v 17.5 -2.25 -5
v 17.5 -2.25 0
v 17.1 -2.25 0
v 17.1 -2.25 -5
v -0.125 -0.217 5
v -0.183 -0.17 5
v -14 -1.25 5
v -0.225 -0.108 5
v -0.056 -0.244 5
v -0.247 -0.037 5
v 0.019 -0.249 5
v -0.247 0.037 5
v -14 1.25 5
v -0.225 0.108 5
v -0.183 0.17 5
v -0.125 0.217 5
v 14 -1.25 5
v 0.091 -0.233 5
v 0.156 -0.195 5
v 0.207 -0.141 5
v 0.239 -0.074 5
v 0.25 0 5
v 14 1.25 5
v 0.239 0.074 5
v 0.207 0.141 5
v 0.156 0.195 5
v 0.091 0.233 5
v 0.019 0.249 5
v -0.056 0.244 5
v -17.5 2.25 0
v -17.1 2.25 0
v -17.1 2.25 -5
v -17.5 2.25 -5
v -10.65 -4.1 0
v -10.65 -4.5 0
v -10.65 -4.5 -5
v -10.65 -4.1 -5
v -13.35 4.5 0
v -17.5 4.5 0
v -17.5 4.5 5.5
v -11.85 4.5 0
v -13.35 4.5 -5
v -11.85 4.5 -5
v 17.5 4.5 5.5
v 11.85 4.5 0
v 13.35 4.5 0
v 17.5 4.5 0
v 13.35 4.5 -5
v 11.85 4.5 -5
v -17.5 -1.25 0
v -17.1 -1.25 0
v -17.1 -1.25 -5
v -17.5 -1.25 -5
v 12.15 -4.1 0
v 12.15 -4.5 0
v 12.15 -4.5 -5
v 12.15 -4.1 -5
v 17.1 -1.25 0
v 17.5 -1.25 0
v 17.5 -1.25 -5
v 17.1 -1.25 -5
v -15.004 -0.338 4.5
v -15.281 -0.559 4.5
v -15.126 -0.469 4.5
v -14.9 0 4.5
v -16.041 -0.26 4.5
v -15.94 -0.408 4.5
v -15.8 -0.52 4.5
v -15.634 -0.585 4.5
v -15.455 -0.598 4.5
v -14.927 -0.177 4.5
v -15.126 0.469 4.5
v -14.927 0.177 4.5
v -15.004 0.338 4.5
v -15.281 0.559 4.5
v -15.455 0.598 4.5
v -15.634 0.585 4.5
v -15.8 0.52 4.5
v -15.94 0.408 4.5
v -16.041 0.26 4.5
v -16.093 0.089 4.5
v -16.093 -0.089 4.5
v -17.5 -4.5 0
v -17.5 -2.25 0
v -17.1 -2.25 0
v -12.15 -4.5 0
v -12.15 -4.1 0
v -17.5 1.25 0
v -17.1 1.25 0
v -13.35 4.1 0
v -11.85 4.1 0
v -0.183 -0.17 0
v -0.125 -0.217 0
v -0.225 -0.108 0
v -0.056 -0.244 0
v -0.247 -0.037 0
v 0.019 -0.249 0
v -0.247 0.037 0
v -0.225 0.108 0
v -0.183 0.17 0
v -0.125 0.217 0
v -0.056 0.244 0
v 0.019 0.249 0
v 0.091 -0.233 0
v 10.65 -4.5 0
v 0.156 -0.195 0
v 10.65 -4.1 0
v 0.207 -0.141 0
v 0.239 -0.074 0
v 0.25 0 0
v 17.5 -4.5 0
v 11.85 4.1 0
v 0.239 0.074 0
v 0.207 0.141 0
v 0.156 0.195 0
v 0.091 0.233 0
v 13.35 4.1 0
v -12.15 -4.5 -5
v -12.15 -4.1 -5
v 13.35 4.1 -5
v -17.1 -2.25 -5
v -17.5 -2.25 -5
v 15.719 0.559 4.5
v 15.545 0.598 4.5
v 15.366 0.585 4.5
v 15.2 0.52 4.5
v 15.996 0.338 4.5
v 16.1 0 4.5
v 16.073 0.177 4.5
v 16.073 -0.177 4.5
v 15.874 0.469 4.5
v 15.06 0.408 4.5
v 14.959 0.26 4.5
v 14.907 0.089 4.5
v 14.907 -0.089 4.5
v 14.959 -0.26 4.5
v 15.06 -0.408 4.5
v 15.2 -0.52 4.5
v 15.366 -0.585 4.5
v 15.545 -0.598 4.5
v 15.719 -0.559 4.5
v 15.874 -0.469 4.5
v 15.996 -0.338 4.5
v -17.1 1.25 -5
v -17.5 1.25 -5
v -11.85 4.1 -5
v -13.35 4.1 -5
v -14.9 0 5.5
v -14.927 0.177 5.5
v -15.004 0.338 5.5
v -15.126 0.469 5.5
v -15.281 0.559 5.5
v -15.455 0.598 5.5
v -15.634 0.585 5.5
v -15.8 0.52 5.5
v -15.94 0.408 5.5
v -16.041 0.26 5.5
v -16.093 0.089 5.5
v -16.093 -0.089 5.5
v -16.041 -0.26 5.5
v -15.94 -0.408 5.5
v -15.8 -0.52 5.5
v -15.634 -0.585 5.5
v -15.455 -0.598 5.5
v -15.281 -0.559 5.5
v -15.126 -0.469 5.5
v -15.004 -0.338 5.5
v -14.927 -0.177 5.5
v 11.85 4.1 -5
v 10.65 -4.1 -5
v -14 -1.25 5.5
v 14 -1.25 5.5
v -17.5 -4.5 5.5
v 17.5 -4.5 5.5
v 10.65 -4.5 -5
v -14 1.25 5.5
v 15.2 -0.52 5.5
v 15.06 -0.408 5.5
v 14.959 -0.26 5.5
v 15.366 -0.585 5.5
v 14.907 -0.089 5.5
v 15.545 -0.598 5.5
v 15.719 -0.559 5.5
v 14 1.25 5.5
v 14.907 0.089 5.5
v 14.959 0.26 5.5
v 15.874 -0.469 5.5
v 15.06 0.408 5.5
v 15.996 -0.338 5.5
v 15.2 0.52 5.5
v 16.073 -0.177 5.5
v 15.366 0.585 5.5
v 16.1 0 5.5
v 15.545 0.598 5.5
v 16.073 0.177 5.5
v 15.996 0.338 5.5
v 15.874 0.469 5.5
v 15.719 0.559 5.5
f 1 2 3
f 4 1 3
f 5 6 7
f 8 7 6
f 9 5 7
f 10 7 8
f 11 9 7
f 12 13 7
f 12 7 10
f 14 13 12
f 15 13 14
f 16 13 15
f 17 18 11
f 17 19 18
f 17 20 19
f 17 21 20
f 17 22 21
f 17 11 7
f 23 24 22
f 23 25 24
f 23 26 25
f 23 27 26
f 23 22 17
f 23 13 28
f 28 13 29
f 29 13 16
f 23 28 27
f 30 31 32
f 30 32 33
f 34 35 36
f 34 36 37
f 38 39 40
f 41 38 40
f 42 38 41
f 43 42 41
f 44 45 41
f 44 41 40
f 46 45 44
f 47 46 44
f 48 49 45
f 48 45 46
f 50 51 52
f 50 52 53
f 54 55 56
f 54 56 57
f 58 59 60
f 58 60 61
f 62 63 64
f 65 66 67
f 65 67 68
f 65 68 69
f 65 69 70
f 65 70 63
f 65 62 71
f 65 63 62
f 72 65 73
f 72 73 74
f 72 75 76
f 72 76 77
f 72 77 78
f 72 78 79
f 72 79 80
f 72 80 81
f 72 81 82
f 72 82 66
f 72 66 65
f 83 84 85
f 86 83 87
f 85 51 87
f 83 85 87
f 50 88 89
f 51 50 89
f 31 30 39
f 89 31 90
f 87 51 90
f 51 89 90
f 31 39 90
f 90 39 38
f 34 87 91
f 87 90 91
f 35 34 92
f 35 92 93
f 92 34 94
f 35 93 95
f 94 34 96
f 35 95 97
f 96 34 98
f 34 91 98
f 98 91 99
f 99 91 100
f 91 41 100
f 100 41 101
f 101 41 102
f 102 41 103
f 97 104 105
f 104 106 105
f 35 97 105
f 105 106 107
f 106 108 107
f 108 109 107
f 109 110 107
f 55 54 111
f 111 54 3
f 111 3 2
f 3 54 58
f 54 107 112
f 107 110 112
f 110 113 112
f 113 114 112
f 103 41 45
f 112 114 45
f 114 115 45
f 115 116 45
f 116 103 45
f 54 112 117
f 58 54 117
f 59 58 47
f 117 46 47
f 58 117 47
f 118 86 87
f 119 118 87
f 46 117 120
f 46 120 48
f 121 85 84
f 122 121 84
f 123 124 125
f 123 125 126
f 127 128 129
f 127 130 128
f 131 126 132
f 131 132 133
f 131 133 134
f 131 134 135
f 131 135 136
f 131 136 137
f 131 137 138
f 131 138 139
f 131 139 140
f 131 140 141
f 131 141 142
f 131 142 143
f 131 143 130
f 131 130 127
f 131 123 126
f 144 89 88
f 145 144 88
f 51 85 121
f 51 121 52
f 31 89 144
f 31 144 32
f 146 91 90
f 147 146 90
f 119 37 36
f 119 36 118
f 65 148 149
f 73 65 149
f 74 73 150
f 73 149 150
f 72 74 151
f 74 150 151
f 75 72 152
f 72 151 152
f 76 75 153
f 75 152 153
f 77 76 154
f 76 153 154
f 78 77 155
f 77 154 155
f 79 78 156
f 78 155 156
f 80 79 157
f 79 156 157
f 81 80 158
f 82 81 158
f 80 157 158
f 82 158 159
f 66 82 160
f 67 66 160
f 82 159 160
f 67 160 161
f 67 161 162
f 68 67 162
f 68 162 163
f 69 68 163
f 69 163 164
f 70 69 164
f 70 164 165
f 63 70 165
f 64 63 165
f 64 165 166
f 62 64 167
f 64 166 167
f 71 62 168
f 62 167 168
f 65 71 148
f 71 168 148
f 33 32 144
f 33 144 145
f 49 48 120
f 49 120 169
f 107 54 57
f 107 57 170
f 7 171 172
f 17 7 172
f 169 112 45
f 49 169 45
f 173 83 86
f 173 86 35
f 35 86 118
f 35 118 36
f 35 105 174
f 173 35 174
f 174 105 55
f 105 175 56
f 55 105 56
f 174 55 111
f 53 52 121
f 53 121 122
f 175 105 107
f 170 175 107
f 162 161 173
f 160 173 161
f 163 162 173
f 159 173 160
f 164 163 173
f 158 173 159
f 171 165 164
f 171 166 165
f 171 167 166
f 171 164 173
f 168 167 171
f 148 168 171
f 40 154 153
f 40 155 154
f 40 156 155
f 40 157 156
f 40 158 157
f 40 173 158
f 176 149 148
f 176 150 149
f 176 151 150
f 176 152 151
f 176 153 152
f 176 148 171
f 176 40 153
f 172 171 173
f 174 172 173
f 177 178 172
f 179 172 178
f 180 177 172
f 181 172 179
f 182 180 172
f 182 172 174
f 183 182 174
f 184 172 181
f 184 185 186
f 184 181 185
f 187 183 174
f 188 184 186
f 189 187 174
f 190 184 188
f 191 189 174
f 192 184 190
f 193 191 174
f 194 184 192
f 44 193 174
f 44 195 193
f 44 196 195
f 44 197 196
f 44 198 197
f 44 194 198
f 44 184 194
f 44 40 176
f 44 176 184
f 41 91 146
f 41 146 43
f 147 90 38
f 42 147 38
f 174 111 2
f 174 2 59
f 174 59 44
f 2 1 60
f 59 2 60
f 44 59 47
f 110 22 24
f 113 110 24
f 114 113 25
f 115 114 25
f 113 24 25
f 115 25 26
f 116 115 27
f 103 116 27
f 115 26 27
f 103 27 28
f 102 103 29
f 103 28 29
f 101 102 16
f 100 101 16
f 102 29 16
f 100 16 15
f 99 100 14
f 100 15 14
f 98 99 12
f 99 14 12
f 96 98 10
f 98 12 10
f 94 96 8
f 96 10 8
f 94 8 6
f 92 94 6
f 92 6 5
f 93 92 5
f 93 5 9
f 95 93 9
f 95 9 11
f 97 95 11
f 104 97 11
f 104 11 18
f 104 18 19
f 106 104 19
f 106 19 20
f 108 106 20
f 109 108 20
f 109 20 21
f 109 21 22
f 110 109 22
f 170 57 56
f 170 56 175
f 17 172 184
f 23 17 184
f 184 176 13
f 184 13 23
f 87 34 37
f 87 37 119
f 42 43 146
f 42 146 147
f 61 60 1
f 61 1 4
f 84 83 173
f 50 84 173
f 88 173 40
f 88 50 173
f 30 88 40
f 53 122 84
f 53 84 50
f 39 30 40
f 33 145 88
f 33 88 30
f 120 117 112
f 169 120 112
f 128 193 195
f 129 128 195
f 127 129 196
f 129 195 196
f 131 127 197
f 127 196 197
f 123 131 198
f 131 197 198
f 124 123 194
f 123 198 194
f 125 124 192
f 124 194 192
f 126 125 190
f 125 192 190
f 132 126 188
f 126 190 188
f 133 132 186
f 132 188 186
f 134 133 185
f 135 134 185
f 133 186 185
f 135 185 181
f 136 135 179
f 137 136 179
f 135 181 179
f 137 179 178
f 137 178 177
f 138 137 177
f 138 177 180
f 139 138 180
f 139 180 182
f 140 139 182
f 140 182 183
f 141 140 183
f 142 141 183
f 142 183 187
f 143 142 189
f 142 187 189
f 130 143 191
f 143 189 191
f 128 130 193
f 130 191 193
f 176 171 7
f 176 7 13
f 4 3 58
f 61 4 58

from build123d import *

# Parameters (mm, degrees)
BODY_2_W                        = 35
BODY_2_H                        = 9
BODY_DEPTH                      = 5.5
HOLES_2_R                       = 0.6
HOLES_DEPTH                     = 1
CHANNEL_2_W                     = 28
CHANNEL_2_H                     = 2.5
CHANNEL_DEPTH                   = 0.5
CONNECTION_PINS_2_W             = 1.5
CONNECTION_PINS_2_H             = 0.4
CONNECTION_PINS_2_W_2           = 0.4
CONNECTION_PINS_2_H_2           = 1
CONNECTION_PINS_DEPTH           = 5
SKIZZE1_R                       = 0.25
SCHNITT_LINEAR_AUSTRAGEN1_DEPTH = 11


with BuildPart() as part:
    # body 2 → body (new body)
    with BuildSketch(Plane.XY):
        Rectangle(BODY_2_W, BODY_2_H)
    extrude(amount=BODY_DEPTH)

    # holes 2 → holes (cut)
    with BuildSketch(Plane.XY.offset(5.5)):
        with Locations((-15.5, 0)):
            Circle(HOLES_2_R)
        with Locations((15.5, 0)):
            Circle(HOLES_2_R)
    extrude(amount=-HOLES_DEPTH, mode=Mode.SUBTRACT)

    # channel 2 → channel (cut)
    with BuildSketch(Plane.XY.offset(5.5)):
        Rectangle(CHANNEL_2_W, CHANNEL_2_H)
    extrude(amount=-CHANNEL_DEPTH, mode=Mode.SUBTRACT)

    # connection pins 2 → connection pins (add)
    with BuildSketch(Plane(origin=(0, 0, 0), x_dir=(-1, 0, 0), z_dir=(0, 0, -1))):
        with Locations((-12.6, 4.3)):
            Rectangle(CONNECTION_PINS_2_W, CONNECTION_PINS_2_H)
        with Locations((12.6, 4.3)):
            Rectangle(CONNECTION_PINS_2_W, CONNECTION_PINS_2_H)
        with Locations((-11.4, -4.3)):
            Rectangle(CONNECTION_PINS_2_W, CONNECTION_PINS_2_H)
        with Locations((-17.3, -1.75)):
            Rectangle(CONNECTION_PINS_2_W_2, CONNECTION_PINS_2_H_2)
        with Locations((11.4, -4.3)):
            Rectangle(CONNECTION_PINS_2_W, CONNECTION_PINS_2_H)
        with Locations((17.3, 1.75)):
            Rectangle(CONNECTION_PINS_2_W_2, CONNECTION_PINS_2_H_2)
        with Locations((17.3, -1.75)):
            Rectangle(CONNECTION_PINS_2_W_2, CONNECTION_PINS_2_H_2)
    extrude(amount=CONNECTION_PINS_DEPTH)

    # Skizze1 → Schnitt-Linear austragen1 (cut, through all)
    with BuildSketch(Plane.XY.offset(5)):
        Circle(SKIZZE1_R)
    extrude(amount=-SCHNITT_LINEAR_AUSTRAGEN1_DEPTH, mode=Mode.SUBTRACT)


solid = part.part
